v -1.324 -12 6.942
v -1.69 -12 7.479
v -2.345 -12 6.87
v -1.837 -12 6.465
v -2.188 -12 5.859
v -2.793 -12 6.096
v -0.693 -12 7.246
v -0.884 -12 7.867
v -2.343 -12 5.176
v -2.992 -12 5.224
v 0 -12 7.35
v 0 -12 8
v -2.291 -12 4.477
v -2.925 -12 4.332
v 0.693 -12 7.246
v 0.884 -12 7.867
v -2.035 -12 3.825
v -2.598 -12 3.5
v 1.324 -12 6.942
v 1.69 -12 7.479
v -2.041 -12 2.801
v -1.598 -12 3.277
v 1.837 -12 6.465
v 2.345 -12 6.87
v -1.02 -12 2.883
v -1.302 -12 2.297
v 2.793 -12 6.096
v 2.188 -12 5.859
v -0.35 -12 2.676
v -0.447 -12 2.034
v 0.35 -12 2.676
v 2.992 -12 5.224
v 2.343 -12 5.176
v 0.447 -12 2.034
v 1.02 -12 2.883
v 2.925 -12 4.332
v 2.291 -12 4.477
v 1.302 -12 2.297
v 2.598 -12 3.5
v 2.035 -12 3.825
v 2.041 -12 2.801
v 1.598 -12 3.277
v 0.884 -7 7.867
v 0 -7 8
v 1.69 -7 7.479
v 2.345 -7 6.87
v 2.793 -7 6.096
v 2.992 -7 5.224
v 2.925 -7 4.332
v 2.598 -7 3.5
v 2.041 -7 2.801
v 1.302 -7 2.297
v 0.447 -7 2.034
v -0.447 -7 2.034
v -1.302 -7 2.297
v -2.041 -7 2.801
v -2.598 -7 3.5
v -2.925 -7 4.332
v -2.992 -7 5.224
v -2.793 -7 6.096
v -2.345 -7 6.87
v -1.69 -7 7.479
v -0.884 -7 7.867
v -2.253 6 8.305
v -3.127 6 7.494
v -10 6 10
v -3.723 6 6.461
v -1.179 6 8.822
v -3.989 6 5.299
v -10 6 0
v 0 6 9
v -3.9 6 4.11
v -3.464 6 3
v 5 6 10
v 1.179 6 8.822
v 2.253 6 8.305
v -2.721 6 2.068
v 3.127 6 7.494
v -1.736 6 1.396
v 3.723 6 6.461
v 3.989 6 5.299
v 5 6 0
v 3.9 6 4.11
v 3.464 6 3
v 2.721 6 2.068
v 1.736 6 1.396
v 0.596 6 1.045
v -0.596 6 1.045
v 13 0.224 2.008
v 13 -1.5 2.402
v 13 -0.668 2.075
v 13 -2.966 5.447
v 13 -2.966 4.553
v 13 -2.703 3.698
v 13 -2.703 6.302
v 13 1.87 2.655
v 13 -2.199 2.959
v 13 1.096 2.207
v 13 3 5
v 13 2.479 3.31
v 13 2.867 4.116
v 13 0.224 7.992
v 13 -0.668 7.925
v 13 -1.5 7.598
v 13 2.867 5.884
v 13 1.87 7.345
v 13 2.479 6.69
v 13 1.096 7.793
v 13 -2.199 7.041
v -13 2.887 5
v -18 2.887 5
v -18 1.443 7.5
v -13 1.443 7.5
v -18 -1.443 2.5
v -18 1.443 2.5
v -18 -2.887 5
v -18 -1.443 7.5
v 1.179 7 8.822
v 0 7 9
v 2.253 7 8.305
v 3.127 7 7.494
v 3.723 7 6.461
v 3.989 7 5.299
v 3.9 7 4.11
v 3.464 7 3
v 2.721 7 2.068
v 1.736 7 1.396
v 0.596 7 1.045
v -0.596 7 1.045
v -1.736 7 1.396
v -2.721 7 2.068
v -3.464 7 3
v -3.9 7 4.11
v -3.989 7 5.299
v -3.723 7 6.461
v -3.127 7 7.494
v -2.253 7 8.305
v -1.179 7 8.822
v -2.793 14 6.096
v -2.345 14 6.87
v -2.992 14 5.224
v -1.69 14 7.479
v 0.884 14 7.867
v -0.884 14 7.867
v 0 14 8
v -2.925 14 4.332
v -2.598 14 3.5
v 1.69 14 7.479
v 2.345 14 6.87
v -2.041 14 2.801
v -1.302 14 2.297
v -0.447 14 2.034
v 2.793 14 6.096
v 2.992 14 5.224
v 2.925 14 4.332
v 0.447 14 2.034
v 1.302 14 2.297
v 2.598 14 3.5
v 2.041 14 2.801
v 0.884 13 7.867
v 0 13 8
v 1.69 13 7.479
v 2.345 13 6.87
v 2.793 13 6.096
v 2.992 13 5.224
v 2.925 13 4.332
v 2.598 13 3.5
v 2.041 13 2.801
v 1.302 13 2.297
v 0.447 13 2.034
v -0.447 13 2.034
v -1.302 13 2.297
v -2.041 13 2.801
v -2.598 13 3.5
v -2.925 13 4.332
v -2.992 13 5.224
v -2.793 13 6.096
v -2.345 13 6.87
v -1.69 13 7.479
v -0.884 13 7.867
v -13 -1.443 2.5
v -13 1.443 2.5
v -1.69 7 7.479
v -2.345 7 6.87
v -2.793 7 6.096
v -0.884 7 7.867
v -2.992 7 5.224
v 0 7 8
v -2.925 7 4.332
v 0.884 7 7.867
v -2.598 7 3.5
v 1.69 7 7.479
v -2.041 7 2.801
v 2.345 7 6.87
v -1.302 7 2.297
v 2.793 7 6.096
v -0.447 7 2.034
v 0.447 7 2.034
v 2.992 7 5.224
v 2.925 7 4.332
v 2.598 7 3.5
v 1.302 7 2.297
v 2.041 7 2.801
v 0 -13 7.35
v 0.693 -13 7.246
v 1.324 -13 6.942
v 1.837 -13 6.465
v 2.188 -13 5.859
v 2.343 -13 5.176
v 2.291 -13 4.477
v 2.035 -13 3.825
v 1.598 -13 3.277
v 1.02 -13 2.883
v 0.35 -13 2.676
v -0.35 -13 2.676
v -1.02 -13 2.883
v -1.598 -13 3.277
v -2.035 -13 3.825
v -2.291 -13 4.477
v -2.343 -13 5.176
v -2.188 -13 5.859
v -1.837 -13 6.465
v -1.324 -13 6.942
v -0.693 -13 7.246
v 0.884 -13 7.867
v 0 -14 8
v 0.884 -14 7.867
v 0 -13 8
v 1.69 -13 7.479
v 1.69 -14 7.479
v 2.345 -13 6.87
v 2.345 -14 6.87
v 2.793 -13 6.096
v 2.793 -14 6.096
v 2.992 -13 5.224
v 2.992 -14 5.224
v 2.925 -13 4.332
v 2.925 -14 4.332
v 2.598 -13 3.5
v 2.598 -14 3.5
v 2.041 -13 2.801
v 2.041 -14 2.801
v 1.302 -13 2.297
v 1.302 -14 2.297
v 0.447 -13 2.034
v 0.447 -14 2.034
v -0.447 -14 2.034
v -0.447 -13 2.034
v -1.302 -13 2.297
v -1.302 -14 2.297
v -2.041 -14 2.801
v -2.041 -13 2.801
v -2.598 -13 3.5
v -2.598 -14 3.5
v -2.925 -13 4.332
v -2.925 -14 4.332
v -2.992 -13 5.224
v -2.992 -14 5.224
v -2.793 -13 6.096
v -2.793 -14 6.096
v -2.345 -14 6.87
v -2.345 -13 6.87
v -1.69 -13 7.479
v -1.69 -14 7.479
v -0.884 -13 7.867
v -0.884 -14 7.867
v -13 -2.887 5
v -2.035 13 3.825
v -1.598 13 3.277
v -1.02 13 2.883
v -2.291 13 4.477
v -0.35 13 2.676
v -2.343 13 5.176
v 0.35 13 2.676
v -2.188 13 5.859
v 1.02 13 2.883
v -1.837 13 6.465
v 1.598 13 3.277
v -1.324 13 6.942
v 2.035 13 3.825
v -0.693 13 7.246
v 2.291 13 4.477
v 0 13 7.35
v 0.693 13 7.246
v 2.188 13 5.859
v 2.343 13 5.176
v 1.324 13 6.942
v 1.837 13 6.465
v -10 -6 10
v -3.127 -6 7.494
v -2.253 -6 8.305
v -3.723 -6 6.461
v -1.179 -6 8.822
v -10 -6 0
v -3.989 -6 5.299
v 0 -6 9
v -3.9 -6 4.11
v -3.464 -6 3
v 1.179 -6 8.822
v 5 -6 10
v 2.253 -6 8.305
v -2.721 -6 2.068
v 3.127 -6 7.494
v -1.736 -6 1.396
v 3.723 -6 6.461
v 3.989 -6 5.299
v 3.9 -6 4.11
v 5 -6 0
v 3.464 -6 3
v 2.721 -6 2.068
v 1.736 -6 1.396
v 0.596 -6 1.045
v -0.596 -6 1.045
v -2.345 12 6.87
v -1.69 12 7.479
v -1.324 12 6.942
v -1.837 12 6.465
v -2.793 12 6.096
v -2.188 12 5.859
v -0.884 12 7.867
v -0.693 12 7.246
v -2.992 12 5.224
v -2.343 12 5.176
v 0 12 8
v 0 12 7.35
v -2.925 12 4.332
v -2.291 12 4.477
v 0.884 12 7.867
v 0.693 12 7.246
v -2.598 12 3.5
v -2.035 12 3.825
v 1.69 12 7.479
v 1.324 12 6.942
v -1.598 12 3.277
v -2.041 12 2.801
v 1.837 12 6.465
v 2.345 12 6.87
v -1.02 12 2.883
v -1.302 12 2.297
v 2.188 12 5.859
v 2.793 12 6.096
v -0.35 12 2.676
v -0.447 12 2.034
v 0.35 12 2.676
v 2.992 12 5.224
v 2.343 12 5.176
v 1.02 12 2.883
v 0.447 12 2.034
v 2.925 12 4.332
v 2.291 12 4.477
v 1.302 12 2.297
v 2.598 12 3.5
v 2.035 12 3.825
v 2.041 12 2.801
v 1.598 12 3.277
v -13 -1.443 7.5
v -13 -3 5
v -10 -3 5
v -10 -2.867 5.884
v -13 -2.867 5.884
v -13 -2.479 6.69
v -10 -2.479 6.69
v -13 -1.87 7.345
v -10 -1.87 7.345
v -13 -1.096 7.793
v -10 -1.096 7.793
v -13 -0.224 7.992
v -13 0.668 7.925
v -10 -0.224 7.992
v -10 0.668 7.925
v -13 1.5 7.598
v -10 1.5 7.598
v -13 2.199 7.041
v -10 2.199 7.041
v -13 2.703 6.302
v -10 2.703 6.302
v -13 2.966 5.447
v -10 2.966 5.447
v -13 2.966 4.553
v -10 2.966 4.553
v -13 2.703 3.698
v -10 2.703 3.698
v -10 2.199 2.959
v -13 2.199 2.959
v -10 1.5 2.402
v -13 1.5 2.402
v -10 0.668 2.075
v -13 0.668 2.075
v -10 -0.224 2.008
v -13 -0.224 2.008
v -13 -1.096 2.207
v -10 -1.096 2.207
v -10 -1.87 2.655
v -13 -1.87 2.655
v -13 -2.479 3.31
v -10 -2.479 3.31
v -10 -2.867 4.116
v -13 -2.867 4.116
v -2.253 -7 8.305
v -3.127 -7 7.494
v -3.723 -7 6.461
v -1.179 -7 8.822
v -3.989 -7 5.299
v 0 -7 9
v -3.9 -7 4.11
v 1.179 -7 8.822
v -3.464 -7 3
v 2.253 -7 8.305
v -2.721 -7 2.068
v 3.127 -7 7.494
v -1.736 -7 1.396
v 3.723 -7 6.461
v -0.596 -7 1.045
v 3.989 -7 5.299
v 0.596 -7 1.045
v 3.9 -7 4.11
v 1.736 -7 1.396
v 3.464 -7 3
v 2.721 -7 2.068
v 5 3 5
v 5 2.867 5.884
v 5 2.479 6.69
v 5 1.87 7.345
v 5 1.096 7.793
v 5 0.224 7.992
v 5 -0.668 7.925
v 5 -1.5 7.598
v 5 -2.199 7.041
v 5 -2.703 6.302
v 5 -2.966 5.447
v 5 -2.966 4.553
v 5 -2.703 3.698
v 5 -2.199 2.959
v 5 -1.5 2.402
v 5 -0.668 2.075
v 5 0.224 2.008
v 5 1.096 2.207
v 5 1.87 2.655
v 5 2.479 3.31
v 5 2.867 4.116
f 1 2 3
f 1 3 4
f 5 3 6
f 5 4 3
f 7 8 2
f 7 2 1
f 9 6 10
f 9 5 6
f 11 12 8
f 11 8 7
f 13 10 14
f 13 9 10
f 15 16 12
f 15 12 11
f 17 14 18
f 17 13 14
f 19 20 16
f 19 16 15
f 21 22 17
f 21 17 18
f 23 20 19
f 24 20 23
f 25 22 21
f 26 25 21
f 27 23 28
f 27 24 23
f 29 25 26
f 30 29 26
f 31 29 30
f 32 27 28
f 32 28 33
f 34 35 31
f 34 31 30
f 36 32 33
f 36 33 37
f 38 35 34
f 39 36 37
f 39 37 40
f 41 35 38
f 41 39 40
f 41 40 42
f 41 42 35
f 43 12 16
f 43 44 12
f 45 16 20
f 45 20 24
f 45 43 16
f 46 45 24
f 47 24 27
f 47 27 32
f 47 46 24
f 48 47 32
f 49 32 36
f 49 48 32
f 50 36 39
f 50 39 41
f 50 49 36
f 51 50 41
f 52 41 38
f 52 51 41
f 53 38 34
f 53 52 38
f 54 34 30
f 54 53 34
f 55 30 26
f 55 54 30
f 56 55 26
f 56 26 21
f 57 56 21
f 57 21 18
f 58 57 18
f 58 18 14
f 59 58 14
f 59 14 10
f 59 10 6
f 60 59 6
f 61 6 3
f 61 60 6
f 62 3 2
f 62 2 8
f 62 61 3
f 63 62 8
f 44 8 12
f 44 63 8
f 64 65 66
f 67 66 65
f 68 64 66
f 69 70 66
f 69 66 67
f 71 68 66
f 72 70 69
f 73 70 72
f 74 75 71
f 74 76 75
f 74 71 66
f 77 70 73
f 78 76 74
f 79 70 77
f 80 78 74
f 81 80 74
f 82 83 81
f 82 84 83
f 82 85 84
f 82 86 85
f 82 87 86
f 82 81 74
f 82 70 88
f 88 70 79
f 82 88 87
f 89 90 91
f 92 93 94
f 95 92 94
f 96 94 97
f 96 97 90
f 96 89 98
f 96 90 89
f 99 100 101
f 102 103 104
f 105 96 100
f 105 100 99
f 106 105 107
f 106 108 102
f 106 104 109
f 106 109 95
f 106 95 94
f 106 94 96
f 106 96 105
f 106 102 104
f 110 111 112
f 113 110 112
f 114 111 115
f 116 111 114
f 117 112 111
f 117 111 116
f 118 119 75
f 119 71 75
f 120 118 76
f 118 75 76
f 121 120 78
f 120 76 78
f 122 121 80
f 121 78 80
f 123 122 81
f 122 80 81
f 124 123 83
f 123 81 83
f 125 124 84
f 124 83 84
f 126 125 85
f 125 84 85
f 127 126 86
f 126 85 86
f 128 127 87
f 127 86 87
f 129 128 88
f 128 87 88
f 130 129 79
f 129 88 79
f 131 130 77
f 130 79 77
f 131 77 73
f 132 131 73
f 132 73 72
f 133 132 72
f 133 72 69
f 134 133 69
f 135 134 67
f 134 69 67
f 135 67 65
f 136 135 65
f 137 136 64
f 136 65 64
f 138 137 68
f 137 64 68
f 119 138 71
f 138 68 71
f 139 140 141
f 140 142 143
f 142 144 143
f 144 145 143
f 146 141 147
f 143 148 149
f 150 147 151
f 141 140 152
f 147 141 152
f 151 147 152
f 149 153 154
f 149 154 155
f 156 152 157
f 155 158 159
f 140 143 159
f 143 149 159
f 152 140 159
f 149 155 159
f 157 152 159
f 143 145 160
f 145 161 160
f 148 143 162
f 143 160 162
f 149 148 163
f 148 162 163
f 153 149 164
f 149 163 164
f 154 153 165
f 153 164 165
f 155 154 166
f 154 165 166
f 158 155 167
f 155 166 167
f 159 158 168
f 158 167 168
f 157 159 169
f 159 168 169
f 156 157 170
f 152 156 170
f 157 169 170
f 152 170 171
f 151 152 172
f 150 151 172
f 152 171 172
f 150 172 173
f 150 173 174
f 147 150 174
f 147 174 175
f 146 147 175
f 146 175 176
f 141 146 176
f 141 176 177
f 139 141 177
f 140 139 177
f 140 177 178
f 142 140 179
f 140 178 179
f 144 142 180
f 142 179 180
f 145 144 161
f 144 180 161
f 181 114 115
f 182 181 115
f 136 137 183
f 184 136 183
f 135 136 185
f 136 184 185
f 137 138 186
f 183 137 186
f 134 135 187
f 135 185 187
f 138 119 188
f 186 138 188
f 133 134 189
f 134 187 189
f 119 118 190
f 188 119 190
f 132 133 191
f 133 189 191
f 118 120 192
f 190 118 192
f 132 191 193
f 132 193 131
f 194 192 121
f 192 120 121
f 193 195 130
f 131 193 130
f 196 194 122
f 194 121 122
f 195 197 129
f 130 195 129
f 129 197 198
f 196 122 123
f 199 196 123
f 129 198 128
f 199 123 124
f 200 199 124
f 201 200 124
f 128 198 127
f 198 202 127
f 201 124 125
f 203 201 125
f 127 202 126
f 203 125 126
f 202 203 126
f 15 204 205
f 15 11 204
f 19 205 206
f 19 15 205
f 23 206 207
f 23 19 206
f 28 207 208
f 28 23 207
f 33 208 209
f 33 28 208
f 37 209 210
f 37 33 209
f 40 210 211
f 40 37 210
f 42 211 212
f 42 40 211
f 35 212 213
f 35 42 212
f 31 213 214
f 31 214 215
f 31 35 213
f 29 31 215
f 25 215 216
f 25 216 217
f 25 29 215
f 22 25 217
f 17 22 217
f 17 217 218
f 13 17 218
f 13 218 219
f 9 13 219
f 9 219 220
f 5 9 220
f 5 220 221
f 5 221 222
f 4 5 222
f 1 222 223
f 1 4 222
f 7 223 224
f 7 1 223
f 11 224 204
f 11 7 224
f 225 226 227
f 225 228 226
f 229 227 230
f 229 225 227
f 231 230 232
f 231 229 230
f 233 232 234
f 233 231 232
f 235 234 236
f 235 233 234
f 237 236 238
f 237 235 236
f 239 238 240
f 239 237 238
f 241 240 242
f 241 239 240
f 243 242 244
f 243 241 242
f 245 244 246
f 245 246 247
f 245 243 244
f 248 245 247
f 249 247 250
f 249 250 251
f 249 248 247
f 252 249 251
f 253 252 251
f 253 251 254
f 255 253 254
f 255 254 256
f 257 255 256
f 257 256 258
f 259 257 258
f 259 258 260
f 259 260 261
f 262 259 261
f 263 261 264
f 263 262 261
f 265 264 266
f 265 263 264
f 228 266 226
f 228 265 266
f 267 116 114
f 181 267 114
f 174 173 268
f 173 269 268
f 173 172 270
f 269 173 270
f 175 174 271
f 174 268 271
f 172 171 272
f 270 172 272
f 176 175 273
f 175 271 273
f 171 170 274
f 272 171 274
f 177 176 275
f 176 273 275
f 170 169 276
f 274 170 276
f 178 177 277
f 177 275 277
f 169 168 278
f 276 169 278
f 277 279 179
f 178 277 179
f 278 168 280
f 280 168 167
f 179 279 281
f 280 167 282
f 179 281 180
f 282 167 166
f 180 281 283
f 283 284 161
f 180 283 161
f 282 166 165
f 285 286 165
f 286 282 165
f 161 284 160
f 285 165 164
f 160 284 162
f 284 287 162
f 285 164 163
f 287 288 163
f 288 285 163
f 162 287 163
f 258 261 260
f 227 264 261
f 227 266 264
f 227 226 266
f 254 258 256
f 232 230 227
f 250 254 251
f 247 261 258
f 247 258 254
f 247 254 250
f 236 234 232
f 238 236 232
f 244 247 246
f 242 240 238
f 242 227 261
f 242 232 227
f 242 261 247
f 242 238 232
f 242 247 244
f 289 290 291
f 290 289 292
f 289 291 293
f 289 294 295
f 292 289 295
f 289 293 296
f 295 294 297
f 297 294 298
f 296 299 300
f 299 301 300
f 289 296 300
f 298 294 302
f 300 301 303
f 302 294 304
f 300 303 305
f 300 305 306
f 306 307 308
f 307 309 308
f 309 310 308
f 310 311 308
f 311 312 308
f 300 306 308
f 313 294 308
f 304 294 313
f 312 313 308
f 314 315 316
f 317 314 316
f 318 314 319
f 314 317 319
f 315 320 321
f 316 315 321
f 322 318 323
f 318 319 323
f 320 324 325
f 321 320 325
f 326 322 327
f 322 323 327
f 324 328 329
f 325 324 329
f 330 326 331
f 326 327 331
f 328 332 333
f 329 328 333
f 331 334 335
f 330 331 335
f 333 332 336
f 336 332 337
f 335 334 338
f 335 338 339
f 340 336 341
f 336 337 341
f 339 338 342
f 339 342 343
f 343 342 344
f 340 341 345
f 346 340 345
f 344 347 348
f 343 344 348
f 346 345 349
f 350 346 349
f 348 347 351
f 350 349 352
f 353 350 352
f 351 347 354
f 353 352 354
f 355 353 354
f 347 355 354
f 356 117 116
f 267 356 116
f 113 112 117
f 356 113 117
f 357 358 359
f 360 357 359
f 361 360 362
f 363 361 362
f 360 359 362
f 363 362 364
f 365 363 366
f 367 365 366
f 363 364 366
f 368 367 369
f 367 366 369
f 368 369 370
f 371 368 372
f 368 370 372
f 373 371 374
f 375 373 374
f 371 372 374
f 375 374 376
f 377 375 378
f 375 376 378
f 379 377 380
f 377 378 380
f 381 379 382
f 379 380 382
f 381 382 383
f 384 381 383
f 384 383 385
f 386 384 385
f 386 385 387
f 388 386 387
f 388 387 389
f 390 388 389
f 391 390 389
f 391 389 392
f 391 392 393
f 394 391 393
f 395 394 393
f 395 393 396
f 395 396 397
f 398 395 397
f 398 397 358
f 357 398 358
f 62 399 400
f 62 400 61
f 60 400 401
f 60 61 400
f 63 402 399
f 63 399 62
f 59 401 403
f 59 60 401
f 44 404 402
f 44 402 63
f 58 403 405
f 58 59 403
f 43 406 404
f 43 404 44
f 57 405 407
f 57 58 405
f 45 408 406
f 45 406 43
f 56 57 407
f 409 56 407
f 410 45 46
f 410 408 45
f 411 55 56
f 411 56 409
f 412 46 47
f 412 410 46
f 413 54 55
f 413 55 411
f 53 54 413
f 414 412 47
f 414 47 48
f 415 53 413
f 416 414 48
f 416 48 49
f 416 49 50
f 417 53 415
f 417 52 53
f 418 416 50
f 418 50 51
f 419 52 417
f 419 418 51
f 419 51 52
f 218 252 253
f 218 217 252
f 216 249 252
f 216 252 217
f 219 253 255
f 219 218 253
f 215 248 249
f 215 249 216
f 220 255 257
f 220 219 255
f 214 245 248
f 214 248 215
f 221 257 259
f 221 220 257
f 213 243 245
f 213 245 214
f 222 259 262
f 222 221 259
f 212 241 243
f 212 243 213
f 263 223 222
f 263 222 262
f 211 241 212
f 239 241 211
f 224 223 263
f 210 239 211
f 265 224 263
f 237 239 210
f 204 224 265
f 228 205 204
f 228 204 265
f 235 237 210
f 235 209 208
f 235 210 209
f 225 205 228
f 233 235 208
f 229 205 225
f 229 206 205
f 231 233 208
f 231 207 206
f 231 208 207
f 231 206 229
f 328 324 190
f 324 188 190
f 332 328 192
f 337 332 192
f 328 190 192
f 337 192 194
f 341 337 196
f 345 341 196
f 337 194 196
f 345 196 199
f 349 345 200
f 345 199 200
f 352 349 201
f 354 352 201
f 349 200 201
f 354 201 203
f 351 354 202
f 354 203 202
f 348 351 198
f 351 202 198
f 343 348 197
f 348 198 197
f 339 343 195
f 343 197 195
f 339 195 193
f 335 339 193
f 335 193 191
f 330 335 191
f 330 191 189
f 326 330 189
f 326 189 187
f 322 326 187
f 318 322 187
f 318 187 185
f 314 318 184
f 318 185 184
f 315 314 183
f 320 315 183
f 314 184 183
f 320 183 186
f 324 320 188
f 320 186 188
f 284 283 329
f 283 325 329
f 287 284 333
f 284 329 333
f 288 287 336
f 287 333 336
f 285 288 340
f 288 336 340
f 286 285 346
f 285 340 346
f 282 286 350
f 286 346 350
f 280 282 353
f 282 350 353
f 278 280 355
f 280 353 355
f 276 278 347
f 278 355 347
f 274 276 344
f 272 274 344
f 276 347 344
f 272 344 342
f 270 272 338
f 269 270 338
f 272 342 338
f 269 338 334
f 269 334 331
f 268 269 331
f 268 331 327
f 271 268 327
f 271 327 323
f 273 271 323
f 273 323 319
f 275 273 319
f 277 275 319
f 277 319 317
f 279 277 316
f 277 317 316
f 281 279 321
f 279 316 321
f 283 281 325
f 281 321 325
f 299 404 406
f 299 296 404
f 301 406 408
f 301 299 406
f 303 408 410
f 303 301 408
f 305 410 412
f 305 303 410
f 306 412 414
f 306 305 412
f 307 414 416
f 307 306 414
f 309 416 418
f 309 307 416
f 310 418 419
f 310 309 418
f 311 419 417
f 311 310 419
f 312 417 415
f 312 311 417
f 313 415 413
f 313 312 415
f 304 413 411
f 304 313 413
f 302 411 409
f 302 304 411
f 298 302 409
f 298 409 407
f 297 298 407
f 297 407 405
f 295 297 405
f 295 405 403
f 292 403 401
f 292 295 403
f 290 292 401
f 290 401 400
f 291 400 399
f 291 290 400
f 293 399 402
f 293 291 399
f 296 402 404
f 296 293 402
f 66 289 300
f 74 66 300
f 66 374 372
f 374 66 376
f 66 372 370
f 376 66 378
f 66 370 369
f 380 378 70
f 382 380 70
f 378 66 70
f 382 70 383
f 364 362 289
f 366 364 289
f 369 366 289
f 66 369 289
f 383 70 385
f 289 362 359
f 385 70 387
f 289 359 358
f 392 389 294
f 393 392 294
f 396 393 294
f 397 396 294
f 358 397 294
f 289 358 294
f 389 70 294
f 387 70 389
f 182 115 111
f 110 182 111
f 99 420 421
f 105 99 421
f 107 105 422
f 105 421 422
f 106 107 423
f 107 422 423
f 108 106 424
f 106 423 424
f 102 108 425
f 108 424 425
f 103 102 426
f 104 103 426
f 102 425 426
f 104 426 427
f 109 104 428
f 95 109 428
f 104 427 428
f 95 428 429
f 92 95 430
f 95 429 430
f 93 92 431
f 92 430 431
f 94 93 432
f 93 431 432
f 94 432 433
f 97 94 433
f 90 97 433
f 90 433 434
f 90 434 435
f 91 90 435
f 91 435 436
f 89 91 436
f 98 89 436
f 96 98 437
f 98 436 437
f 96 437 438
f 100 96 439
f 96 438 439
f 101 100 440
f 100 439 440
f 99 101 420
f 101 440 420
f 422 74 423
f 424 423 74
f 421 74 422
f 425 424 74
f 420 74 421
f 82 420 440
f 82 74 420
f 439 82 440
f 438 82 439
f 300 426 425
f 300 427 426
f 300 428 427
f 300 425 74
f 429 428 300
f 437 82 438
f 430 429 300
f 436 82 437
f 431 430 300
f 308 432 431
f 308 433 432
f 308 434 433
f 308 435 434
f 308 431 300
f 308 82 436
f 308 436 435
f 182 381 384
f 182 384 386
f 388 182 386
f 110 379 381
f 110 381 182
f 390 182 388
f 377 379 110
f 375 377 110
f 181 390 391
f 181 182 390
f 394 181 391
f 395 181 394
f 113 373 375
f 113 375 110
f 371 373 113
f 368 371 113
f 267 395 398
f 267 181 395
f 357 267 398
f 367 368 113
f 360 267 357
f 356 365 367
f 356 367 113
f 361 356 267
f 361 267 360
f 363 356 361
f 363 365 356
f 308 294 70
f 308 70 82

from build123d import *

# Parameters (mm, degrees)
F0_W      = 15
F0_H      = 6
F1_DEPTH  = 10
F5_R      = 3
F6_DEPTH  = 8
F7_R      = 3
F8_DEPTH  = 8
F9_R      = 3
F10_DEPTH = 5


with BuildPart() as f1:
    # F0 (on Top) → F1 (new body)
    with BuildSketch(Plane.XY):
        with Locations((-2.5, 3)):
            Rectangle(F0_W, F0_H)
    extrude(amount=F1_DEPTH)

    # F2 (on Right) → F3 (revolve)
    with BuildSketch(Plane.YZ):
        Polygon((6, 9), (6, 5), (14, 5), (14, 8), (13, 8), (13, 7.35), (12, 7.35), (12, 8), (7, 8), (7, 9), align=None)
    revolve(axis=Axis((0, 10, 5), (0, 1, 0)))

    # F4: F1 across plane


with BuildPart() as f1_1:
    add(f1.part)
    add(f1.part.mirror(Plane.XZ))

    # F5 (on face) → F6 (join)
    with BuildSketch(Plane.YZ.offset(5)):
        with Locations((0, 5)):
            Circle(F5_R)
    extrude(amount=F6_DEPTH)

    # F7 (on face) → F8 (join)
    with BuildSketch(Plane(origin=(-10, 0, 0), x_dir=(0, -1, 0), z_dir=(-1, 0, 0))):
        with Locations((0, 5)):
            Circle(F7_R)
    extrude(amount=F8_DEPTH)

    # F9 (on face) → F10 (cut)
    with BuildSketch(Plane(origin=(-18, 0, 0), x_dir=(0, -1, 0), z_dir=(-1, 0, 0))):
        with Locations((0, 5)):
            Circle(F9_R)
        Polygon((-1.443376, 7.5), (1.443376, 7.5), (2.886751, 5), (1.443376, 2.5), (-1.443376, 2.5), (-2.886751, 5), align=None, mode=Mode.SUBTRACT)
    extrude(amount=-F10_DEPTH, mode=Mode.SUBTRACT)


solid = f1_1.part
